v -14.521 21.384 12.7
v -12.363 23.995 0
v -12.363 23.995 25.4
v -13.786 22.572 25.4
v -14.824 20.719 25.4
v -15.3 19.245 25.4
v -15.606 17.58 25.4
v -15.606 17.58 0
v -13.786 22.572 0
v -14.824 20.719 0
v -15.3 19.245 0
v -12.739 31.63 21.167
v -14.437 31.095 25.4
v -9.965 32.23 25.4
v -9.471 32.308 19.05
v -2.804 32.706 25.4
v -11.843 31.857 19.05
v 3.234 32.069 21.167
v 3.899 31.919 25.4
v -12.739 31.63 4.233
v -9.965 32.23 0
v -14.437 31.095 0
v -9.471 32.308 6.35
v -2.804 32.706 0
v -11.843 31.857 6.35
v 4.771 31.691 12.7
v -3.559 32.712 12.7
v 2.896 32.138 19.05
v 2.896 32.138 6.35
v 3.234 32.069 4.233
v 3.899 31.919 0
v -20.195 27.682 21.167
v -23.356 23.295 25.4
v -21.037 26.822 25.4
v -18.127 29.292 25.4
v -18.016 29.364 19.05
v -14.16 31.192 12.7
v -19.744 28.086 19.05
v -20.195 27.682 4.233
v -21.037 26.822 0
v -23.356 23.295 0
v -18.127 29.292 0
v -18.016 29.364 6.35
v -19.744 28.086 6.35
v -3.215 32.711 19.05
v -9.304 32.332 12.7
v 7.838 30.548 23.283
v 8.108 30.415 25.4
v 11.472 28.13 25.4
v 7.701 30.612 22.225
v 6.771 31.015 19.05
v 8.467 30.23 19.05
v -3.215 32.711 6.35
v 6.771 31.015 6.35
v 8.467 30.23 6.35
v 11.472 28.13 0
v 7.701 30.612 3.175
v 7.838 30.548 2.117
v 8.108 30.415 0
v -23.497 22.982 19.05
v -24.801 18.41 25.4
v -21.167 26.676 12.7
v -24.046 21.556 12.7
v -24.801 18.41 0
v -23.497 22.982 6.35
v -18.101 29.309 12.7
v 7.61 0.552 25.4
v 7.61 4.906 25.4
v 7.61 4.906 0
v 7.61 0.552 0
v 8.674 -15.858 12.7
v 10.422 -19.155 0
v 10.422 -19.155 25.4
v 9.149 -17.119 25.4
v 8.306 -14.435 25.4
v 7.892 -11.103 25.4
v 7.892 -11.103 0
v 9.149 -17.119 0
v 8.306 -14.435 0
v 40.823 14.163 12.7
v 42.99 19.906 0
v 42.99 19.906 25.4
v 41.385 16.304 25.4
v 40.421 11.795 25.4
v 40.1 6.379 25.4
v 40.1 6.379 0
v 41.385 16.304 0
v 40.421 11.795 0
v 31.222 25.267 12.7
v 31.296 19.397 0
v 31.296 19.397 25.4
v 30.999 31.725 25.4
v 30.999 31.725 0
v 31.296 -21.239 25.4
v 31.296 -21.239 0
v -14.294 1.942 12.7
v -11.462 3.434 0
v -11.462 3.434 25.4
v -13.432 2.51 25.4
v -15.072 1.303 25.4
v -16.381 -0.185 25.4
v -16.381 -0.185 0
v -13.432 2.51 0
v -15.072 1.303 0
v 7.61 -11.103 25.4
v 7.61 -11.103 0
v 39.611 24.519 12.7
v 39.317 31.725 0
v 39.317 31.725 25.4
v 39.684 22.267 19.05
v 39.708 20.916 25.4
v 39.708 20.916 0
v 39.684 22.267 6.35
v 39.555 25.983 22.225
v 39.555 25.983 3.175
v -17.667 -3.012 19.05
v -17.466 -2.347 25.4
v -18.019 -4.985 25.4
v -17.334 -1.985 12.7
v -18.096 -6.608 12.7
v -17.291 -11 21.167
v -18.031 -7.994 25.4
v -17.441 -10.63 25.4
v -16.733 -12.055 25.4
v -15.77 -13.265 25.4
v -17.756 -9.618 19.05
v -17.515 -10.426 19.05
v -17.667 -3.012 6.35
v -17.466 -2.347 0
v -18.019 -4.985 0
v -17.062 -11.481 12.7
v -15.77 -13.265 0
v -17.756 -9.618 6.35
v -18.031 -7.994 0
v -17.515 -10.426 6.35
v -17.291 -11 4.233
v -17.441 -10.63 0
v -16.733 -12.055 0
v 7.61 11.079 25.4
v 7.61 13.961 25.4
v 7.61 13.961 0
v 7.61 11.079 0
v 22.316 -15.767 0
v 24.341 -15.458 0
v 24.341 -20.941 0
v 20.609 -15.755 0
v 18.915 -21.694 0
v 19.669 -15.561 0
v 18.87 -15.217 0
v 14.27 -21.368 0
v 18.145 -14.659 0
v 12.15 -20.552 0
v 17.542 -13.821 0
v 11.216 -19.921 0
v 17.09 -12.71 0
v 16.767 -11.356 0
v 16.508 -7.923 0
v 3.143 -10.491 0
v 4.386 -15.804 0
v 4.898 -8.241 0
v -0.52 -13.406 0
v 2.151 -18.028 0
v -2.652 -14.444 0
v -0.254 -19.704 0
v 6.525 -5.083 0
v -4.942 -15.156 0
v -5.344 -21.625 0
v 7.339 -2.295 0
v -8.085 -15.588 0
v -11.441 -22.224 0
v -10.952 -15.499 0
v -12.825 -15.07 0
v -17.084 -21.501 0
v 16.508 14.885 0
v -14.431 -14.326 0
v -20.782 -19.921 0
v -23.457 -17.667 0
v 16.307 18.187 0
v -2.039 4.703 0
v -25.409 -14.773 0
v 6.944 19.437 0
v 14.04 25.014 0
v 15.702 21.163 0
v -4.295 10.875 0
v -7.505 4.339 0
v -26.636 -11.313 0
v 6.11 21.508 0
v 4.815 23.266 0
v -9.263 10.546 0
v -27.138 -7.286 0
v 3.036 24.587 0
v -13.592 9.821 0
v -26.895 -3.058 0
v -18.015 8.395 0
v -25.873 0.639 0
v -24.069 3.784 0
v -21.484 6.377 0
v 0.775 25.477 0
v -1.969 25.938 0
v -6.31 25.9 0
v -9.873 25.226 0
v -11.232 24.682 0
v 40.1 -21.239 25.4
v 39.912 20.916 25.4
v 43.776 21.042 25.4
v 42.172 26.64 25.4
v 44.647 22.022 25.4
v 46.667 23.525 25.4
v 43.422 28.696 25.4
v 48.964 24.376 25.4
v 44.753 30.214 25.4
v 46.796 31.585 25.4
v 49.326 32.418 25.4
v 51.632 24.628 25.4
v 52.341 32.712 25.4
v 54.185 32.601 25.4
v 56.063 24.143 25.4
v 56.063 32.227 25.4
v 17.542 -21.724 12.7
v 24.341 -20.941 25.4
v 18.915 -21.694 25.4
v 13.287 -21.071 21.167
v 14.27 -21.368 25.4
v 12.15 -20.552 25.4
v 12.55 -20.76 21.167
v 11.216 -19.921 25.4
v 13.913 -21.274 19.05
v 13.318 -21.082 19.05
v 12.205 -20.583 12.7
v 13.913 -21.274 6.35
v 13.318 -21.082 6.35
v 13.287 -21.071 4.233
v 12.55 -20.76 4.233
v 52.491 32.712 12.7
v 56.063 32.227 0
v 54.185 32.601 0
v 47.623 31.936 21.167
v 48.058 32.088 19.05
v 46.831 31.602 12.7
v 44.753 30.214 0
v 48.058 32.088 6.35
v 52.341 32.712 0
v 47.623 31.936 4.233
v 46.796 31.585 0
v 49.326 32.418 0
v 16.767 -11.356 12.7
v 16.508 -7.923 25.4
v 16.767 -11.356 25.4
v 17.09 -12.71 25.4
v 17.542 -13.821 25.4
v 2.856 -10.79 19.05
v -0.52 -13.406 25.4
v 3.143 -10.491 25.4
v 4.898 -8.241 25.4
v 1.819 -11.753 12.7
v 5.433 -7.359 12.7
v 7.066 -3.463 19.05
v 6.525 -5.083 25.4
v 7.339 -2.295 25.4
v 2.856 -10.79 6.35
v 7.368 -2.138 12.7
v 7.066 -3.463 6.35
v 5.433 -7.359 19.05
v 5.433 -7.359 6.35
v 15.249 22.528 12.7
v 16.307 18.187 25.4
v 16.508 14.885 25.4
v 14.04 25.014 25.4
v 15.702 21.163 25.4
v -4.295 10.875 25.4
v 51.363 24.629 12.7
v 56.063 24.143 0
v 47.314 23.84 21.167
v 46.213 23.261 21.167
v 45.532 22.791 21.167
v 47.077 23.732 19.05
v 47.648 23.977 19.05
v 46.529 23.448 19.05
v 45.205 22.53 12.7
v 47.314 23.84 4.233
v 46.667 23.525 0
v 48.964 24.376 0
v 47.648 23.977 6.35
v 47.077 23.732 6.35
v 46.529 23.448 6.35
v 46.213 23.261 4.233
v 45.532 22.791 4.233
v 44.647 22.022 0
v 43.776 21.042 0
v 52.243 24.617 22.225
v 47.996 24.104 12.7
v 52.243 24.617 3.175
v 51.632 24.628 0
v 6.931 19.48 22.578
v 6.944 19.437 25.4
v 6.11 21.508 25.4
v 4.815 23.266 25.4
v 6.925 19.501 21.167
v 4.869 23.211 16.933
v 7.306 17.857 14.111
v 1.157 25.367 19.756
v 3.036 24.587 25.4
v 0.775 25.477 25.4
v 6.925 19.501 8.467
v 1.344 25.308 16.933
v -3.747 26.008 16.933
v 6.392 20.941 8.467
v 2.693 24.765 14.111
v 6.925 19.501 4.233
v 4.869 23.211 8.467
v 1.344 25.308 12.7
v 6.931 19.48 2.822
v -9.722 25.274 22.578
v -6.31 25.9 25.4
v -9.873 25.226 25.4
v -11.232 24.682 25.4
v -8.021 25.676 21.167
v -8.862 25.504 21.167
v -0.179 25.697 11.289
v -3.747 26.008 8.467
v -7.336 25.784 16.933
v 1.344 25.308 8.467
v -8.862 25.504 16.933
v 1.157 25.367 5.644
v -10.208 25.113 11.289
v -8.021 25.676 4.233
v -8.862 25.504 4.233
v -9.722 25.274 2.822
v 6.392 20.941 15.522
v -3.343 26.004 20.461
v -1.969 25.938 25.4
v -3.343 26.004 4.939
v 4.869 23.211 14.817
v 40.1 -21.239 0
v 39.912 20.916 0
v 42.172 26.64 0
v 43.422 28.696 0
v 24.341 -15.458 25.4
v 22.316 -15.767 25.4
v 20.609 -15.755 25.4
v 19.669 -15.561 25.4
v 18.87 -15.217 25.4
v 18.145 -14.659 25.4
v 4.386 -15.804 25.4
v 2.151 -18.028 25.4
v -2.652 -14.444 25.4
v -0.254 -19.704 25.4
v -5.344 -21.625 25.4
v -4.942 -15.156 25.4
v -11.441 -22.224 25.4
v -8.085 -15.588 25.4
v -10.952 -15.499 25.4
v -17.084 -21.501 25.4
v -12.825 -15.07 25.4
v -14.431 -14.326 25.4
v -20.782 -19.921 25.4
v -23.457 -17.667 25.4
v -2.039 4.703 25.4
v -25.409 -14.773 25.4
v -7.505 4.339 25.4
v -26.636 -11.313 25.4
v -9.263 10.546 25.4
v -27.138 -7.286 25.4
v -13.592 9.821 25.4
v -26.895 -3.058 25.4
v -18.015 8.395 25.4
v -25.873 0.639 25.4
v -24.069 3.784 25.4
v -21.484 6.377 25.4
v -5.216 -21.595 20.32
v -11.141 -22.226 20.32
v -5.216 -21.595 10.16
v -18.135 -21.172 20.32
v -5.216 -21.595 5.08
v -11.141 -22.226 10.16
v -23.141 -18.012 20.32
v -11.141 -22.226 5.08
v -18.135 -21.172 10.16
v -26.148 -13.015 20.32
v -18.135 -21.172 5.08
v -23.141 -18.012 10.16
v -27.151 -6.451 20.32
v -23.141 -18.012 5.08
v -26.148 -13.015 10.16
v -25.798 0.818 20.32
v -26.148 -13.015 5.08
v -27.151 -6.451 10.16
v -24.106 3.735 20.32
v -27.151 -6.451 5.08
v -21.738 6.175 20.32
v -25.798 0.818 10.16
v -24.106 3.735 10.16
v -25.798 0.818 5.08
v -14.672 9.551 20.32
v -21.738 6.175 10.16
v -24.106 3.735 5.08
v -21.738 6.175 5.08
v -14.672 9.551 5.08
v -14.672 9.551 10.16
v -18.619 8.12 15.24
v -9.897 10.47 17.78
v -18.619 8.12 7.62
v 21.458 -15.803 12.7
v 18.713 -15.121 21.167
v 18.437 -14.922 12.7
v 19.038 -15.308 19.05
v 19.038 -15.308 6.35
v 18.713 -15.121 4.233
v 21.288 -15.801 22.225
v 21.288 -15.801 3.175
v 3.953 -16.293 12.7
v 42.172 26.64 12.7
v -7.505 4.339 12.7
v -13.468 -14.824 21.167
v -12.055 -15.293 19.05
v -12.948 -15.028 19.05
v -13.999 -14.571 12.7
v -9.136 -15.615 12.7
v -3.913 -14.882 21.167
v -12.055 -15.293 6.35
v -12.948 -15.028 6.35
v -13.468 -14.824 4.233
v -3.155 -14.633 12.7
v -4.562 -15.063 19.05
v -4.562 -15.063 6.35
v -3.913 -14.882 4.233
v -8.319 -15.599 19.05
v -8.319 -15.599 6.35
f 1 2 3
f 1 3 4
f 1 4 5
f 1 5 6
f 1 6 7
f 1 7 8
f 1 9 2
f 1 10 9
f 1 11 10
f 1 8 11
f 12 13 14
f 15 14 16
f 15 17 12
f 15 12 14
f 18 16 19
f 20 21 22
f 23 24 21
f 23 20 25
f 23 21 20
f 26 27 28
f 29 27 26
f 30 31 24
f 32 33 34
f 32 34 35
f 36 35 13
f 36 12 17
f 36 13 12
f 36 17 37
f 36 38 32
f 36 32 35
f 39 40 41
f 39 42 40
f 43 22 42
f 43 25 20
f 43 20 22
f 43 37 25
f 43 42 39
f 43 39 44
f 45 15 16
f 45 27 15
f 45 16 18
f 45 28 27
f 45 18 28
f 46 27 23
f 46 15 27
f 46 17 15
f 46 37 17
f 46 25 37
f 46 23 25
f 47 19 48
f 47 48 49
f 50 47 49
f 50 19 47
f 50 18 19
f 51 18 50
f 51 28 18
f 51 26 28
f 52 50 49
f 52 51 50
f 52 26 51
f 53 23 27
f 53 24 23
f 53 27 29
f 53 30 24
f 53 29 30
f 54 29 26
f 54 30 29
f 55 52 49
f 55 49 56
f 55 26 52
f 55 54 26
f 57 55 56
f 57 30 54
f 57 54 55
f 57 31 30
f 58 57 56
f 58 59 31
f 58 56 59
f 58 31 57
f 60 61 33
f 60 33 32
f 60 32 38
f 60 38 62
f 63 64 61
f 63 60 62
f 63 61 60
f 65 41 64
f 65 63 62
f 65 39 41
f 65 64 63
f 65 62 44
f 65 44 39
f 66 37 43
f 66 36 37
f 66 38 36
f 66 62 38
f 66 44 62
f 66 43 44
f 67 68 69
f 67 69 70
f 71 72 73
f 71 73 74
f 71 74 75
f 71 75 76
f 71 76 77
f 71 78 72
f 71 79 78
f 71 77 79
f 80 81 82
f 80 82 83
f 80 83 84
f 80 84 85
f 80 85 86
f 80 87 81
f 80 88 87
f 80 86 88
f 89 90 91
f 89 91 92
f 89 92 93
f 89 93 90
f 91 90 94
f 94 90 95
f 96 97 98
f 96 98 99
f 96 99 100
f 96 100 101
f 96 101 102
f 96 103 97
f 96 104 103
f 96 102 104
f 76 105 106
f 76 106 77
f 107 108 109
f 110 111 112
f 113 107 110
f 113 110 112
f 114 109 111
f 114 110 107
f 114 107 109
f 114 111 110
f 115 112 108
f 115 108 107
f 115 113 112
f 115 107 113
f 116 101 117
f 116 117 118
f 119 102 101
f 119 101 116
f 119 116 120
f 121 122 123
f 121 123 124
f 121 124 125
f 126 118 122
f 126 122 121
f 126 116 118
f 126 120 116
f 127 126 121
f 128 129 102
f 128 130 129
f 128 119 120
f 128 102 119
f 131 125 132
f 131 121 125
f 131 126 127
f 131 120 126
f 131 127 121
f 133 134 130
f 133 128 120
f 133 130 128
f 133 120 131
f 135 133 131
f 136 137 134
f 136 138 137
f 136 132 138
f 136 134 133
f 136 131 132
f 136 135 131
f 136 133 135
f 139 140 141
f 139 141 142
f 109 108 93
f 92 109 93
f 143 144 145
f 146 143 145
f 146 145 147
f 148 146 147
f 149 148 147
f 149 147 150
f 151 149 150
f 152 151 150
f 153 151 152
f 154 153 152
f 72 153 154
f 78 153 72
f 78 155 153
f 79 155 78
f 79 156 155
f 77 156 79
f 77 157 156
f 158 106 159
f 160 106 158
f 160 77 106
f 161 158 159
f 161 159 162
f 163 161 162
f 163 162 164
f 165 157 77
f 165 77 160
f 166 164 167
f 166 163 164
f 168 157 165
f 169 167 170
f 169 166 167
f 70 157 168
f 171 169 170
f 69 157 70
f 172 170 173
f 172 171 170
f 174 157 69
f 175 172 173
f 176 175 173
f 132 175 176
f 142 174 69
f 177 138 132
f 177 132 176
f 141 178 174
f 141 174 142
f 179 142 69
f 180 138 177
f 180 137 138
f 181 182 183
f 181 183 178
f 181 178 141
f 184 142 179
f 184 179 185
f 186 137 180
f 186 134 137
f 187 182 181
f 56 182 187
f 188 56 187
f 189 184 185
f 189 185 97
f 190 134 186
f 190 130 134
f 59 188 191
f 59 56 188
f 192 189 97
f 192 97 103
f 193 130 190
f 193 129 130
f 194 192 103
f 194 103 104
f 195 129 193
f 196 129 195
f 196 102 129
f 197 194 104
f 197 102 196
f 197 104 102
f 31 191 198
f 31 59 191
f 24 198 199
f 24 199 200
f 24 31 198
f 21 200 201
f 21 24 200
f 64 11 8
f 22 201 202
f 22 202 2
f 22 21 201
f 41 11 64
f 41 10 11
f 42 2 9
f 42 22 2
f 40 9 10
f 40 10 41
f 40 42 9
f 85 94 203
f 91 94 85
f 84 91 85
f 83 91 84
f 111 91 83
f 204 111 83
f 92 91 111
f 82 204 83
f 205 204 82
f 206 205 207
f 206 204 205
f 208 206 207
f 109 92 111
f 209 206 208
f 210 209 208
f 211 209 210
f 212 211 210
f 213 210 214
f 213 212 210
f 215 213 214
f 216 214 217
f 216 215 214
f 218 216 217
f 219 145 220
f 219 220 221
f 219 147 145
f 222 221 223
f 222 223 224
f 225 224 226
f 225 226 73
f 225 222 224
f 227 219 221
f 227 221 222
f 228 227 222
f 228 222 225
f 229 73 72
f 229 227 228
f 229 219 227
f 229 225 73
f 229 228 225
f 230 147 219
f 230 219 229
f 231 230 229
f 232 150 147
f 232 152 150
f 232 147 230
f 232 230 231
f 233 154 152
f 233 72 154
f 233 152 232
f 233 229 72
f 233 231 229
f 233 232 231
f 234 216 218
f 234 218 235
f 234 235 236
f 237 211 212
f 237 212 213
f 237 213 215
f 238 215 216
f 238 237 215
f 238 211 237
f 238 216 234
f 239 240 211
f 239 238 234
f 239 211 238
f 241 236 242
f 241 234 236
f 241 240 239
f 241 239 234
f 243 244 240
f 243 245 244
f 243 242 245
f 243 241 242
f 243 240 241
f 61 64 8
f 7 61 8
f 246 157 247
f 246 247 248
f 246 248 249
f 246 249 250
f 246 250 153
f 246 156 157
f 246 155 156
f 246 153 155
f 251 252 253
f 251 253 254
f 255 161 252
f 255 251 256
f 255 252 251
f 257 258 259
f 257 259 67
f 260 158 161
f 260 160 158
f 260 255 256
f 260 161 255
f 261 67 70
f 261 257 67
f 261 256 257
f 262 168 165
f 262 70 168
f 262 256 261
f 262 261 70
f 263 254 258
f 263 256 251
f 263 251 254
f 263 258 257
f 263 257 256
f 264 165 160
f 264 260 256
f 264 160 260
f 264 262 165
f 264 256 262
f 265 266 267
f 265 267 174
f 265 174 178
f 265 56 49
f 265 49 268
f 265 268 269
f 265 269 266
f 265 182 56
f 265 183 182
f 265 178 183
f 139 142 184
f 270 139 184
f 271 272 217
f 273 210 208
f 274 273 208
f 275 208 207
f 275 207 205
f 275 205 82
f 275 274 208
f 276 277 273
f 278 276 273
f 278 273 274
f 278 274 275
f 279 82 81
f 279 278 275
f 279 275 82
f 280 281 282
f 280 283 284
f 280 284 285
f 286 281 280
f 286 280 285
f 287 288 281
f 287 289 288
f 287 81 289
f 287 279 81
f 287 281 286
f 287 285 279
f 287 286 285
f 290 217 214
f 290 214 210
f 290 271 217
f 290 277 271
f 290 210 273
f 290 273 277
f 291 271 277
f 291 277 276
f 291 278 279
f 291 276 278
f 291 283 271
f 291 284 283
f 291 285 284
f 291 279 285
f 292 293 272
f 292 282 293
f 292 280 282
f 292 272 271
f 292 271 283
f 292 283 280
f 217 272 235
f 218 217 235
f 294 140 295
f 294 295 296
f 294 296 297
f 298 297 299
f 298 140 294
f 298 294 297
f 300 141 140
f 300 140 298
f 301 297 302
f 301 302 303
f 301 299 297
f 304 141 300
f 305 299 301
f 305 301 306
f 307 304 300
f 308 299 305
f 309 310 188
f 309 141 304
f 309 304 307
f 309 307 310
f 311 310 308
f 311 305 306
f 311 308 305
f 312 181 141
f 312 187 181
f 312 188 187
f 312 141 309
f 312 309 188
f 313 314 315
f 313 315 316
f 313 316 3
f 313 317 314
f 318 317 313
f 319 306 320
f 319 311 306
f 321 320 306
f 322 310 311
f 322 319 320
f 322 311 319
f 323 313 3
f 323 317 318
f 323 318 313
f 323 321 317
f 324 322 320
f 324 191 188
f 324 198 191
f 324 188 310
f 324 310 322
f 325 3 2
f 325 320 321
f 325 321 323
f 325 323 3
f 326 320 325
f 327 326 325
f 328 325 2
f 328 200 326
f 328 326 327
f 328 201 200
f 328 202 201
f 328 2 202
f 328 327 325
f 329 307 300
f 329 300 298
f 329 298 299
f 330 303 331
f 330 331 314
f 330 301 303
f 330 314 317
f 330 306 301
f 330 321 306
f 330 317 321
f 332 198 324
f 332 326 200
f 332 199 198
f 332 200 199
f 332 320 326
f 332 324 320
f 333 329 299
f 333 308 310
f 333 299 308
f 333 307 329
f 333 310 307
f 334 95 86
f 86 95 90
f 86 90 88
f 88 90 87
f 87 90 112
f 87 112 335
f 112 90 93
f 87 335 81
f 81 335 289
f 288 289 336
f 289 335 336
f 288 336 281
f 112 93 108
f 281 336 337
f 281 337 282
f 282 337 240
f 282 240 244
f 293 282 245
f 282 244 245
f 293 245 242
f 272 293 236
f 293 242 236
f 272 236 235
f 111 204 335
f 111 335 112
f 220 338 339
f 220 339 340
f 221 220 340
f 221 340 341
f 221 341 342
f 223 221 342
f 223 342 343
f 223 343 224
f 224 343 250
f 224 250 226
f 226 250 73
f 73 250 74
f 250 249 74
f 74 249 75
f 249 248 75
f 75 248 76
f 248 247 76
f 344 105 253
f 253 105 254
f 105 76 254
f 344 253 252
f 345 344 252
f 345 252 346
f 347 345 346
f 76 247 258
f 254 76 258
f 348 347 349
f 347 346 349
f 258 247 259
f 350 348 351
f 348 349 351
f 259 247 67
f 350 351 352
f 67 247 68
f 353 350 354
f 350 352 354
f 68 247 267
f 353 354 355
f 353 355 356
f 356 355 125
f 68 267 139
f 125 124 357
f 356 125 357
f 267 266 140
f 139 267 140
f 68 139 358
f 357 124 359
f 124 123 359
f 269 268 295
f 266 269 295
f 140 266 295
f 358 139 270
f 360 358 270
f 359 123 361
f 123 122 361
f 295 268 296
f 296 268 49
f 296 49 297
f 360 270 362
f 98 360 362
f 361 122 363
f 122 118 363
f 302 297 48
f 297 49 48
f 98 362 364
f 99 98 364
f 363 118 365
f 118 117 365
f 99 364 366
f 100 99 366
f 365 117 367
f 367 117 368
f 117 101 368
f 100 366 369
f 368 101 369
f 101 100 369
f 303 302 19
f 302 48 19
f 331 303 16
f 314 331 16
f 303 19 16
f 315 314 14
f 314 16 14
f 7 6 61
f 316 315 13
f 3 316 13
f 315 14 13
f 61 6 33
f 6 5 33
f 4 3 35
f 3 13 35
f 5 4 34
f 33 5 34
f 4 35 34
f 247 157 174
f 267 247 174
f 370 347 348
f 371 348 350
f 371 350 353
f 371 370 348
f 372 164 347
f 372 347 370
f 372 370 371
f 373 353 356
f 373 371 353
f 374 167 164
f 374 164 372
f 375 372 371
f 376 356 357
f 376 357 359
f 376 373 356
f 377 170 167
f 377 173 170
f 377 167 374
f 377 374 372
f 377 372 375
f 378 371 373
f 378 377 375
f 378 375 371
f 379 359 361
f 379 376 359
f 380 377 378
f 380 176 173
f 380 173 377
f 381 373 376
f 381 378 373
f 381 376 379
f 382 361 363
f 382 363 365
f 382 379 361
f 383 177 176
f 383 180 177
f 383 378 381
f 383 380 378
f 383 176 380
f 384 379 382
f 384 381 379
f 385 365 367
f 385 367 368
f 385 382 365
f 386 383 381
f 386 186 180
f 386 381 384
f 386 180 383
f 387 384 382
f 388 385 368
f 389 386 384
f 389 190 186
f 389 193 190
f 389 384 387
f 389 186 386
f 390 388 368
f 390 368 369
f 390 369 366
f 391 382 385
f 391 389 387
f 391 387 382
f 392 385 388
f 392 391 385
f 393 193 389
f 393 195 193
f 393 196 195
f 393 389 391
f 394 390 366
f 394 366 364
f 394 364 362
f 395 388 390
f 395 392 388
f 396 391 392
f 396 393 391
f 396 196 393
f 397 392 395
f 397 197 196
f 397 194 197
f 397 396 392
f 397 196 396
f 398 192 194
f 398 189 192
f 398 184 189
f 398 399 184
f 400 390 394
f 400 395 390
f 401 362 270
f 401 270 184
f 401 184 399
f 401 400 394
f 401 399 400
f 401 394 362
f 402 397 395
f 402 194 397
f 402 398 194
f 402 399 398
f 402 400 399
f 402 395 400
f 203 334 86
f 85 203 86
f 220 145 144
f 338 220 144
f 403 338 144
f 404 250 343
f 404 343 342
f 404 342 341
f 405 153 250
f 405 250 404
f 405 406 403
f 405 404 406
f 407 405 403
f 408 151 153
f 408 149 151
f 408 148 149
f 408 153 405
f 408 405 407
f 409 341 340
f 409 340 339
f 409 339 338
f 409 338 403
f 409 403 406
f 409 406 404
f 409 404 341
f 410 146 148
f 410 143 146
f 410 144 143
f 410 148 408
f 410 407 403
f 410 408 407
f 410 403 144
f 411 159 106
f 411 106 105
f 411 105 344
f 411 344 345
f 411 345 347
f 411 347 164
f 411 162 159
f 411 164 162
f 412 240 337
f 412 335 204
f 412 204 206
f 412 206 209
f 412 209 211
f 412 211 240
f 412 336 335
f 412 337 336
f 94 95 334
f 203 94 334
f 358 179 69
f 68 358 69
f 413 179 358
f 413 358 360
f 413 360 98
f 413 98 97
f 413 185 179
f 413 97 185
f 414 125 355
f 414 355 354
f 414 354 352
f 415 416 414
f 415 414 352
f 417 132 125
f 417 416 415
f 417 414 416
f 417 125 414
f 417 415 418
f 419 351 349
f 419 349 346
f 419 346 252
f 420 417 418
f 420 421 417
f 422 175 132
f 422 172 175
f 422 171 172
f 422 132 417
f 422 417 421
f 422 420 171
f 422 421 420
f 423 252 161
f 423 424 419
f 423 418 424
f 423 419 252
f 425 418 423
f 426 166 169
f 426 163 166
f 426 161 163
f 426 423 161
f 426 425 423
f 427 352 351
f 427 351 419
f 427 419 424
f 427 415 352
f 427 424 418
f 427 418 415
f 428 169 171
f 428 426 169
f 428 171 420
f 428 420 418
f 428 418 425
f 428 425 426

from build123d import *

# Parameters (mm, degrees)
F1_DEPTH = 25.4


with BuildPart() as f1:
    # F0 (on Top) → F1 (new body)
    with BuildSketch(Plane.XY):
        with BuildLine():
            Line((31.2962190364, 19.3968032254), (31.2962190364, -21.2388634682))
            Line((31.2962190364, -21.2388634682), (40.1000913116, -21.2388634682))
            Line((40.1000913116, -21.2388634682), (40.1000913116, 6.3789778505))
            add(Edge.make_bspline(
                [(42.9903305194, 19.905923953), (40.1000913116, 15.1828501257), (40.1000913116, 6.3789778505)],
                knots=[0, 0, 0, 1, 1, 1], degree=2))
            add(Edge.make_bspline(
                [(51.3634083327, 24.6289977804), (45.8805697272, 24.6289977804), (42.9903305194, 19.905923953)],
                knots=[0, 0, 0, 1, 1, 1], degree=2))
            add(Edge.make_bspline(
                [(56.0629842803, 24.1433749325), (54.3084759265, 24.6289977804), (51.3634083327, 24.6289977804)],
                knots=[0, 0, 0, 1, 1, 1], degree=2))
            Line((56.0629842803, 24.1433749325), (56.0629842803, 32.2266455623))
            add(Edge.make_bspline(
                [(52.4913065601, 32.7122684103), (54.2458149139, 32.7122684103), (56.0629842803, 32.2266455623)],
                knots=[0, 0, 0, 1, 1, 1], degree=2))
            add(Edge.make_bspline(
                [(44.7526714997, 30.2136605314), (47.4940908025, 32.7122684103), (52.4913065601, 32.7122684103)],
                knots=[0, 0, 0, 1, 1, 1], degree=2))
            add(Edge.make_bspline(
                [(39.9121082737, 20.9163327818), (42.011252197, 27.7150526526), (44.7526714997, 30.2136605314)],
                knots=[0, 0, 0, 1, 1, 1], degree=2))
            Line((39.9121082737, 20.9163327818), (39.7084599826, 20.9163327818))
            add(Edge.make_bspline(
                [(39.3168286537, 31.7253574613), (39.7084599826, 22.717836895), (39.7084599826, 20.9163327818)],
                knots=[0, 0, 0, 1, 1, 1], degree=2))
            Line((39.3168286537, 31.7253574613), (30.9985792264, 31.7253574613))
            add(Edge.make_bspline(
                [(31.2962190364, 19.3968032254), (31.2962190364, 24.9736333499), (30.9985792264, 31.7253574613)],
                knots=[0, 0, 0, 1, 1, 1], degree=2))
        make_face()
        with BuildLine():
            add(Edge.make_bspline(
                [(-11.1409517704, -22.2257744172), (-19.1302308813, -22.2257744172), (-23.1405356899, -18.0118213175)],
                knots=[0, 0, 0, 1, 1, 1], degree=2))
            add(Edge.make_bspline(
                [(-0.2536008251, -19.7036686586), (-4.7338632285, -22.2257744172), (-11.1409517704, -22.2257744172)],
                knots=[0, 0, 0, 1, 1, 1], degree=2))
            add(Edge.make_bspline(
                [(7.6103562606, -11.1034446745), (4.2266615783, -17.1815629001), (-0.2536008251, -19.7036686586)],
                knots=[0, 0, 0, 1, 1, 1], degree=2))
            Line((7.6103562606, -11.1034446745), (7.8923308174, -11.1034446745))
            add(Edge.make_bspline(
                [(10.4222692025, -19.1553847981), (8.1899706274, -16.58628328), (7.8923308174, -11.1034446745)],
                knots=[0, 0, 0, 1, 1, 1], degree=2))
            add(Edge.make_bspline(
                [(17.5421267631, -21.7244863161), (12.6545677776, -21.7244863161), (10.4222692025, -19.1553847981)],
                knots=[0, 0, 0, 1, 1, 1], degree=2))
            add(Edge.make_bspline(
                [(24.340846634, -20.9412236582), (21.0198129644, -21.7244863161), (17.5421267631, -21.7244863161)],
                knots=[0, 0, 0, 1, 1, 1], degree=2))
            Line((24.340846634, -20.9412236582), (24.340846634, -15.4583850526))
            add(Edge.make_bspline(
                [(21.4584400528, -15.8030206221), (22.7273255587, -15.8030206221), (24.340846634, -15.4583850526)],
                knots=[0, 0, 0, 1, 1, 1], degree=2))
            add(Edge.make_bspline(
                [(17.5421267631, -13.8213660975), (18.5760334716, -15.8030206221), (21.4584400528, -15.8030206221)],
                knots=[0, 0, 0, 1, 1, 1], degree=2))
            add(Edge.make_bspline(
                [(16.5082200547, -7.9233982833), (16.5082200547, -11.839711573), (17.5421267631, -13.8213660975)],
                knots=[0, 0, 0, 1, 1, 1], degree=2))
            Line((16.5082200547, -7.9233982833), (16.5082200547, 14.8852103157))
            add(Edge.make_bspline(
                [(11.4718411642, 28.1301818613), (16.5082200547, 23.5480953124), (16.5082200547, 14.8852103157)],
                knots=[0, 0, 0, 1, 1, 1], degree=2))
            add(Edge.make_bspline(
                [(-3.5589692416, 32.7122684103), (6.4354622737, 32.7122684103), (11.4718411642, 28.1301818613)],
                knots=[0, 0, 0, 1, 1, 1], degree=2))
            add(Edge.make_bspline(
                [(-24.8010525247, 18.4098922764), (-22.5452560699, 32.7122684103), (-3.5589692416, 32.7122684103)],
                knots=[0, 0, 0, 1, 1, 1], degree=2))
            Line((-24.8010525247, 18.4098922764), (-15.6055489206, 17.579633859))
            add(Edge.make_bspline(
                [(-12.3628415167, 23.9945550275), (-15.05726506, 21.9815699966), (-15.6055489206, 17.579633859)],
                knots=[0, 0, 0, 1, 1, 1], degree=2))
            add(Edge.make_bspline(
                [(-3.7469522795, 26.0075400583), (-9.6684179734, 26.0075400583), (-12.3628415167, 23.9945550275)],
                knots=[0, 0, 0, 1, 1, 1], degree=2))
            add(Edge.make_bspline(
                [(4.8689369578, 23.2112923695), (2.127517655, 26.0075400583), (-3.7469522795, 26.0075400583)],
                knots=[0, 0, 0, 1, 1, 1], degree=2))
            add(Edge.make_bspline(
                [(7.6103562606, 13.9609603793), (7.6103562606, 20.4150446807), (4.8689369578, 23.2112923695)],
                knots=[0, 0, 0, 1, 1, 1], degree=2))
            Line((7.6103562606, 13.9609603793), (7.6103562606, 11.0785537981))
            Line((7.6103562606, 11.0785537981), (-4.29523614, 10.8749055071))
            add(Edge.make_bspline(
                [(-21.7384955322, 6.1753295595), (-16.3261505659, 10.5772656971), (-4.29523614, 10.8749055071)],
                knots=[0, 0, 0, 1, 1, 1], degree=2))
            add(Edge.make_bspline(
                [(-27.1508404985, -6.4508644864), (-27.1508404985, 1.7733934219), (-21.7384955322, 6.1753295595)],
                knots=[0, 0, 0, 1, 1, 1], degree=2))
            add(Edge.make_bspline(
                [(-23.1405356899, -18.0118213175), (-27.1508404985, -13.7978682178), (-27.1508404985, -6.4508644864)],
                knots=[0, 0, 0, 1, 1, 1], degree=2))
        make_face()
        with BuildLine():
            add(Edge.make_bspline(
                [(-9.135799366, -15.6150375842), (-4.29523614, -15.6150375842), (-0.5199101288, -13.4062368888)],
                knots=[0, 0, 0, 1, 1, 1], degree=2))
            add(Edge.make_bspline(
                [(-15.7700340787, -13.2652496104), (-13.4437439847, -15.6150375842), (-9.135799366, -15.6150375842)],
                knots=[0, 0, 0, 1, 1, 1], degree=2))
            add(Edge.make_bspline(
                [(-18.0963241728, -6.607517018), (-18.0963241728, -10.9154616366), (-15.7700340787, -13.2652496104)],
                knots=[0, 0, 0, 1, 1, 1], degree=2))
            add(Edge.make_bspline(
                [(-16.3809789519, -0.1847632229), (-18.0963241728, -2.6285427157), (-18.0963241728, -6.607517018)],
                knots=[0, 0, 0, 1, 1, 1], degree=2))
            add(Edge.make_bspline(
                [(-11.4620894601, 3.4339102567), (-14.6656337311, 2.2590162698), (-16.3809789519, -0.1847632229)],
                knots=[0, 0, 0, 1, 1, 1], degree=2))
            add(Edge.make_bspline(
                [(-2.0394396852, 4.7027957626), (-8.2585451892, 4.6088042436), (-11.4620894601, 3.4339102567)],
                knots=[0, 0, 0, 1, 1, 1], degree=2))
            Line((-2.0394396852, 4.7027957626), (7.6103562606, 4.9064440536))
            Line((7.6103562606, 4.9064440536), (7.6103562606, 0.5515036755))
            add(Edge.make_bspline(
                [(5.4328860715, -7.3594491696), (7.6103562606, -3.5214621457), (7.6103562606, 0.5515036755)],
                knots=[0, 0, 0, 1, 1, 1], degree=2))
            add(Edge.make_bspline(
                [(-0.5199101288, -13.4062368888), (3.2554158824, -11.1974361935), (5.4328860715, -7.3594491696)],
                knots=[0, 0, 0, 1, 1, 1], degree=2))
        make_face(mode=Mode.SUBTRACT)
    extrude(amount=F1_DEPTH)


solid = f1.part
